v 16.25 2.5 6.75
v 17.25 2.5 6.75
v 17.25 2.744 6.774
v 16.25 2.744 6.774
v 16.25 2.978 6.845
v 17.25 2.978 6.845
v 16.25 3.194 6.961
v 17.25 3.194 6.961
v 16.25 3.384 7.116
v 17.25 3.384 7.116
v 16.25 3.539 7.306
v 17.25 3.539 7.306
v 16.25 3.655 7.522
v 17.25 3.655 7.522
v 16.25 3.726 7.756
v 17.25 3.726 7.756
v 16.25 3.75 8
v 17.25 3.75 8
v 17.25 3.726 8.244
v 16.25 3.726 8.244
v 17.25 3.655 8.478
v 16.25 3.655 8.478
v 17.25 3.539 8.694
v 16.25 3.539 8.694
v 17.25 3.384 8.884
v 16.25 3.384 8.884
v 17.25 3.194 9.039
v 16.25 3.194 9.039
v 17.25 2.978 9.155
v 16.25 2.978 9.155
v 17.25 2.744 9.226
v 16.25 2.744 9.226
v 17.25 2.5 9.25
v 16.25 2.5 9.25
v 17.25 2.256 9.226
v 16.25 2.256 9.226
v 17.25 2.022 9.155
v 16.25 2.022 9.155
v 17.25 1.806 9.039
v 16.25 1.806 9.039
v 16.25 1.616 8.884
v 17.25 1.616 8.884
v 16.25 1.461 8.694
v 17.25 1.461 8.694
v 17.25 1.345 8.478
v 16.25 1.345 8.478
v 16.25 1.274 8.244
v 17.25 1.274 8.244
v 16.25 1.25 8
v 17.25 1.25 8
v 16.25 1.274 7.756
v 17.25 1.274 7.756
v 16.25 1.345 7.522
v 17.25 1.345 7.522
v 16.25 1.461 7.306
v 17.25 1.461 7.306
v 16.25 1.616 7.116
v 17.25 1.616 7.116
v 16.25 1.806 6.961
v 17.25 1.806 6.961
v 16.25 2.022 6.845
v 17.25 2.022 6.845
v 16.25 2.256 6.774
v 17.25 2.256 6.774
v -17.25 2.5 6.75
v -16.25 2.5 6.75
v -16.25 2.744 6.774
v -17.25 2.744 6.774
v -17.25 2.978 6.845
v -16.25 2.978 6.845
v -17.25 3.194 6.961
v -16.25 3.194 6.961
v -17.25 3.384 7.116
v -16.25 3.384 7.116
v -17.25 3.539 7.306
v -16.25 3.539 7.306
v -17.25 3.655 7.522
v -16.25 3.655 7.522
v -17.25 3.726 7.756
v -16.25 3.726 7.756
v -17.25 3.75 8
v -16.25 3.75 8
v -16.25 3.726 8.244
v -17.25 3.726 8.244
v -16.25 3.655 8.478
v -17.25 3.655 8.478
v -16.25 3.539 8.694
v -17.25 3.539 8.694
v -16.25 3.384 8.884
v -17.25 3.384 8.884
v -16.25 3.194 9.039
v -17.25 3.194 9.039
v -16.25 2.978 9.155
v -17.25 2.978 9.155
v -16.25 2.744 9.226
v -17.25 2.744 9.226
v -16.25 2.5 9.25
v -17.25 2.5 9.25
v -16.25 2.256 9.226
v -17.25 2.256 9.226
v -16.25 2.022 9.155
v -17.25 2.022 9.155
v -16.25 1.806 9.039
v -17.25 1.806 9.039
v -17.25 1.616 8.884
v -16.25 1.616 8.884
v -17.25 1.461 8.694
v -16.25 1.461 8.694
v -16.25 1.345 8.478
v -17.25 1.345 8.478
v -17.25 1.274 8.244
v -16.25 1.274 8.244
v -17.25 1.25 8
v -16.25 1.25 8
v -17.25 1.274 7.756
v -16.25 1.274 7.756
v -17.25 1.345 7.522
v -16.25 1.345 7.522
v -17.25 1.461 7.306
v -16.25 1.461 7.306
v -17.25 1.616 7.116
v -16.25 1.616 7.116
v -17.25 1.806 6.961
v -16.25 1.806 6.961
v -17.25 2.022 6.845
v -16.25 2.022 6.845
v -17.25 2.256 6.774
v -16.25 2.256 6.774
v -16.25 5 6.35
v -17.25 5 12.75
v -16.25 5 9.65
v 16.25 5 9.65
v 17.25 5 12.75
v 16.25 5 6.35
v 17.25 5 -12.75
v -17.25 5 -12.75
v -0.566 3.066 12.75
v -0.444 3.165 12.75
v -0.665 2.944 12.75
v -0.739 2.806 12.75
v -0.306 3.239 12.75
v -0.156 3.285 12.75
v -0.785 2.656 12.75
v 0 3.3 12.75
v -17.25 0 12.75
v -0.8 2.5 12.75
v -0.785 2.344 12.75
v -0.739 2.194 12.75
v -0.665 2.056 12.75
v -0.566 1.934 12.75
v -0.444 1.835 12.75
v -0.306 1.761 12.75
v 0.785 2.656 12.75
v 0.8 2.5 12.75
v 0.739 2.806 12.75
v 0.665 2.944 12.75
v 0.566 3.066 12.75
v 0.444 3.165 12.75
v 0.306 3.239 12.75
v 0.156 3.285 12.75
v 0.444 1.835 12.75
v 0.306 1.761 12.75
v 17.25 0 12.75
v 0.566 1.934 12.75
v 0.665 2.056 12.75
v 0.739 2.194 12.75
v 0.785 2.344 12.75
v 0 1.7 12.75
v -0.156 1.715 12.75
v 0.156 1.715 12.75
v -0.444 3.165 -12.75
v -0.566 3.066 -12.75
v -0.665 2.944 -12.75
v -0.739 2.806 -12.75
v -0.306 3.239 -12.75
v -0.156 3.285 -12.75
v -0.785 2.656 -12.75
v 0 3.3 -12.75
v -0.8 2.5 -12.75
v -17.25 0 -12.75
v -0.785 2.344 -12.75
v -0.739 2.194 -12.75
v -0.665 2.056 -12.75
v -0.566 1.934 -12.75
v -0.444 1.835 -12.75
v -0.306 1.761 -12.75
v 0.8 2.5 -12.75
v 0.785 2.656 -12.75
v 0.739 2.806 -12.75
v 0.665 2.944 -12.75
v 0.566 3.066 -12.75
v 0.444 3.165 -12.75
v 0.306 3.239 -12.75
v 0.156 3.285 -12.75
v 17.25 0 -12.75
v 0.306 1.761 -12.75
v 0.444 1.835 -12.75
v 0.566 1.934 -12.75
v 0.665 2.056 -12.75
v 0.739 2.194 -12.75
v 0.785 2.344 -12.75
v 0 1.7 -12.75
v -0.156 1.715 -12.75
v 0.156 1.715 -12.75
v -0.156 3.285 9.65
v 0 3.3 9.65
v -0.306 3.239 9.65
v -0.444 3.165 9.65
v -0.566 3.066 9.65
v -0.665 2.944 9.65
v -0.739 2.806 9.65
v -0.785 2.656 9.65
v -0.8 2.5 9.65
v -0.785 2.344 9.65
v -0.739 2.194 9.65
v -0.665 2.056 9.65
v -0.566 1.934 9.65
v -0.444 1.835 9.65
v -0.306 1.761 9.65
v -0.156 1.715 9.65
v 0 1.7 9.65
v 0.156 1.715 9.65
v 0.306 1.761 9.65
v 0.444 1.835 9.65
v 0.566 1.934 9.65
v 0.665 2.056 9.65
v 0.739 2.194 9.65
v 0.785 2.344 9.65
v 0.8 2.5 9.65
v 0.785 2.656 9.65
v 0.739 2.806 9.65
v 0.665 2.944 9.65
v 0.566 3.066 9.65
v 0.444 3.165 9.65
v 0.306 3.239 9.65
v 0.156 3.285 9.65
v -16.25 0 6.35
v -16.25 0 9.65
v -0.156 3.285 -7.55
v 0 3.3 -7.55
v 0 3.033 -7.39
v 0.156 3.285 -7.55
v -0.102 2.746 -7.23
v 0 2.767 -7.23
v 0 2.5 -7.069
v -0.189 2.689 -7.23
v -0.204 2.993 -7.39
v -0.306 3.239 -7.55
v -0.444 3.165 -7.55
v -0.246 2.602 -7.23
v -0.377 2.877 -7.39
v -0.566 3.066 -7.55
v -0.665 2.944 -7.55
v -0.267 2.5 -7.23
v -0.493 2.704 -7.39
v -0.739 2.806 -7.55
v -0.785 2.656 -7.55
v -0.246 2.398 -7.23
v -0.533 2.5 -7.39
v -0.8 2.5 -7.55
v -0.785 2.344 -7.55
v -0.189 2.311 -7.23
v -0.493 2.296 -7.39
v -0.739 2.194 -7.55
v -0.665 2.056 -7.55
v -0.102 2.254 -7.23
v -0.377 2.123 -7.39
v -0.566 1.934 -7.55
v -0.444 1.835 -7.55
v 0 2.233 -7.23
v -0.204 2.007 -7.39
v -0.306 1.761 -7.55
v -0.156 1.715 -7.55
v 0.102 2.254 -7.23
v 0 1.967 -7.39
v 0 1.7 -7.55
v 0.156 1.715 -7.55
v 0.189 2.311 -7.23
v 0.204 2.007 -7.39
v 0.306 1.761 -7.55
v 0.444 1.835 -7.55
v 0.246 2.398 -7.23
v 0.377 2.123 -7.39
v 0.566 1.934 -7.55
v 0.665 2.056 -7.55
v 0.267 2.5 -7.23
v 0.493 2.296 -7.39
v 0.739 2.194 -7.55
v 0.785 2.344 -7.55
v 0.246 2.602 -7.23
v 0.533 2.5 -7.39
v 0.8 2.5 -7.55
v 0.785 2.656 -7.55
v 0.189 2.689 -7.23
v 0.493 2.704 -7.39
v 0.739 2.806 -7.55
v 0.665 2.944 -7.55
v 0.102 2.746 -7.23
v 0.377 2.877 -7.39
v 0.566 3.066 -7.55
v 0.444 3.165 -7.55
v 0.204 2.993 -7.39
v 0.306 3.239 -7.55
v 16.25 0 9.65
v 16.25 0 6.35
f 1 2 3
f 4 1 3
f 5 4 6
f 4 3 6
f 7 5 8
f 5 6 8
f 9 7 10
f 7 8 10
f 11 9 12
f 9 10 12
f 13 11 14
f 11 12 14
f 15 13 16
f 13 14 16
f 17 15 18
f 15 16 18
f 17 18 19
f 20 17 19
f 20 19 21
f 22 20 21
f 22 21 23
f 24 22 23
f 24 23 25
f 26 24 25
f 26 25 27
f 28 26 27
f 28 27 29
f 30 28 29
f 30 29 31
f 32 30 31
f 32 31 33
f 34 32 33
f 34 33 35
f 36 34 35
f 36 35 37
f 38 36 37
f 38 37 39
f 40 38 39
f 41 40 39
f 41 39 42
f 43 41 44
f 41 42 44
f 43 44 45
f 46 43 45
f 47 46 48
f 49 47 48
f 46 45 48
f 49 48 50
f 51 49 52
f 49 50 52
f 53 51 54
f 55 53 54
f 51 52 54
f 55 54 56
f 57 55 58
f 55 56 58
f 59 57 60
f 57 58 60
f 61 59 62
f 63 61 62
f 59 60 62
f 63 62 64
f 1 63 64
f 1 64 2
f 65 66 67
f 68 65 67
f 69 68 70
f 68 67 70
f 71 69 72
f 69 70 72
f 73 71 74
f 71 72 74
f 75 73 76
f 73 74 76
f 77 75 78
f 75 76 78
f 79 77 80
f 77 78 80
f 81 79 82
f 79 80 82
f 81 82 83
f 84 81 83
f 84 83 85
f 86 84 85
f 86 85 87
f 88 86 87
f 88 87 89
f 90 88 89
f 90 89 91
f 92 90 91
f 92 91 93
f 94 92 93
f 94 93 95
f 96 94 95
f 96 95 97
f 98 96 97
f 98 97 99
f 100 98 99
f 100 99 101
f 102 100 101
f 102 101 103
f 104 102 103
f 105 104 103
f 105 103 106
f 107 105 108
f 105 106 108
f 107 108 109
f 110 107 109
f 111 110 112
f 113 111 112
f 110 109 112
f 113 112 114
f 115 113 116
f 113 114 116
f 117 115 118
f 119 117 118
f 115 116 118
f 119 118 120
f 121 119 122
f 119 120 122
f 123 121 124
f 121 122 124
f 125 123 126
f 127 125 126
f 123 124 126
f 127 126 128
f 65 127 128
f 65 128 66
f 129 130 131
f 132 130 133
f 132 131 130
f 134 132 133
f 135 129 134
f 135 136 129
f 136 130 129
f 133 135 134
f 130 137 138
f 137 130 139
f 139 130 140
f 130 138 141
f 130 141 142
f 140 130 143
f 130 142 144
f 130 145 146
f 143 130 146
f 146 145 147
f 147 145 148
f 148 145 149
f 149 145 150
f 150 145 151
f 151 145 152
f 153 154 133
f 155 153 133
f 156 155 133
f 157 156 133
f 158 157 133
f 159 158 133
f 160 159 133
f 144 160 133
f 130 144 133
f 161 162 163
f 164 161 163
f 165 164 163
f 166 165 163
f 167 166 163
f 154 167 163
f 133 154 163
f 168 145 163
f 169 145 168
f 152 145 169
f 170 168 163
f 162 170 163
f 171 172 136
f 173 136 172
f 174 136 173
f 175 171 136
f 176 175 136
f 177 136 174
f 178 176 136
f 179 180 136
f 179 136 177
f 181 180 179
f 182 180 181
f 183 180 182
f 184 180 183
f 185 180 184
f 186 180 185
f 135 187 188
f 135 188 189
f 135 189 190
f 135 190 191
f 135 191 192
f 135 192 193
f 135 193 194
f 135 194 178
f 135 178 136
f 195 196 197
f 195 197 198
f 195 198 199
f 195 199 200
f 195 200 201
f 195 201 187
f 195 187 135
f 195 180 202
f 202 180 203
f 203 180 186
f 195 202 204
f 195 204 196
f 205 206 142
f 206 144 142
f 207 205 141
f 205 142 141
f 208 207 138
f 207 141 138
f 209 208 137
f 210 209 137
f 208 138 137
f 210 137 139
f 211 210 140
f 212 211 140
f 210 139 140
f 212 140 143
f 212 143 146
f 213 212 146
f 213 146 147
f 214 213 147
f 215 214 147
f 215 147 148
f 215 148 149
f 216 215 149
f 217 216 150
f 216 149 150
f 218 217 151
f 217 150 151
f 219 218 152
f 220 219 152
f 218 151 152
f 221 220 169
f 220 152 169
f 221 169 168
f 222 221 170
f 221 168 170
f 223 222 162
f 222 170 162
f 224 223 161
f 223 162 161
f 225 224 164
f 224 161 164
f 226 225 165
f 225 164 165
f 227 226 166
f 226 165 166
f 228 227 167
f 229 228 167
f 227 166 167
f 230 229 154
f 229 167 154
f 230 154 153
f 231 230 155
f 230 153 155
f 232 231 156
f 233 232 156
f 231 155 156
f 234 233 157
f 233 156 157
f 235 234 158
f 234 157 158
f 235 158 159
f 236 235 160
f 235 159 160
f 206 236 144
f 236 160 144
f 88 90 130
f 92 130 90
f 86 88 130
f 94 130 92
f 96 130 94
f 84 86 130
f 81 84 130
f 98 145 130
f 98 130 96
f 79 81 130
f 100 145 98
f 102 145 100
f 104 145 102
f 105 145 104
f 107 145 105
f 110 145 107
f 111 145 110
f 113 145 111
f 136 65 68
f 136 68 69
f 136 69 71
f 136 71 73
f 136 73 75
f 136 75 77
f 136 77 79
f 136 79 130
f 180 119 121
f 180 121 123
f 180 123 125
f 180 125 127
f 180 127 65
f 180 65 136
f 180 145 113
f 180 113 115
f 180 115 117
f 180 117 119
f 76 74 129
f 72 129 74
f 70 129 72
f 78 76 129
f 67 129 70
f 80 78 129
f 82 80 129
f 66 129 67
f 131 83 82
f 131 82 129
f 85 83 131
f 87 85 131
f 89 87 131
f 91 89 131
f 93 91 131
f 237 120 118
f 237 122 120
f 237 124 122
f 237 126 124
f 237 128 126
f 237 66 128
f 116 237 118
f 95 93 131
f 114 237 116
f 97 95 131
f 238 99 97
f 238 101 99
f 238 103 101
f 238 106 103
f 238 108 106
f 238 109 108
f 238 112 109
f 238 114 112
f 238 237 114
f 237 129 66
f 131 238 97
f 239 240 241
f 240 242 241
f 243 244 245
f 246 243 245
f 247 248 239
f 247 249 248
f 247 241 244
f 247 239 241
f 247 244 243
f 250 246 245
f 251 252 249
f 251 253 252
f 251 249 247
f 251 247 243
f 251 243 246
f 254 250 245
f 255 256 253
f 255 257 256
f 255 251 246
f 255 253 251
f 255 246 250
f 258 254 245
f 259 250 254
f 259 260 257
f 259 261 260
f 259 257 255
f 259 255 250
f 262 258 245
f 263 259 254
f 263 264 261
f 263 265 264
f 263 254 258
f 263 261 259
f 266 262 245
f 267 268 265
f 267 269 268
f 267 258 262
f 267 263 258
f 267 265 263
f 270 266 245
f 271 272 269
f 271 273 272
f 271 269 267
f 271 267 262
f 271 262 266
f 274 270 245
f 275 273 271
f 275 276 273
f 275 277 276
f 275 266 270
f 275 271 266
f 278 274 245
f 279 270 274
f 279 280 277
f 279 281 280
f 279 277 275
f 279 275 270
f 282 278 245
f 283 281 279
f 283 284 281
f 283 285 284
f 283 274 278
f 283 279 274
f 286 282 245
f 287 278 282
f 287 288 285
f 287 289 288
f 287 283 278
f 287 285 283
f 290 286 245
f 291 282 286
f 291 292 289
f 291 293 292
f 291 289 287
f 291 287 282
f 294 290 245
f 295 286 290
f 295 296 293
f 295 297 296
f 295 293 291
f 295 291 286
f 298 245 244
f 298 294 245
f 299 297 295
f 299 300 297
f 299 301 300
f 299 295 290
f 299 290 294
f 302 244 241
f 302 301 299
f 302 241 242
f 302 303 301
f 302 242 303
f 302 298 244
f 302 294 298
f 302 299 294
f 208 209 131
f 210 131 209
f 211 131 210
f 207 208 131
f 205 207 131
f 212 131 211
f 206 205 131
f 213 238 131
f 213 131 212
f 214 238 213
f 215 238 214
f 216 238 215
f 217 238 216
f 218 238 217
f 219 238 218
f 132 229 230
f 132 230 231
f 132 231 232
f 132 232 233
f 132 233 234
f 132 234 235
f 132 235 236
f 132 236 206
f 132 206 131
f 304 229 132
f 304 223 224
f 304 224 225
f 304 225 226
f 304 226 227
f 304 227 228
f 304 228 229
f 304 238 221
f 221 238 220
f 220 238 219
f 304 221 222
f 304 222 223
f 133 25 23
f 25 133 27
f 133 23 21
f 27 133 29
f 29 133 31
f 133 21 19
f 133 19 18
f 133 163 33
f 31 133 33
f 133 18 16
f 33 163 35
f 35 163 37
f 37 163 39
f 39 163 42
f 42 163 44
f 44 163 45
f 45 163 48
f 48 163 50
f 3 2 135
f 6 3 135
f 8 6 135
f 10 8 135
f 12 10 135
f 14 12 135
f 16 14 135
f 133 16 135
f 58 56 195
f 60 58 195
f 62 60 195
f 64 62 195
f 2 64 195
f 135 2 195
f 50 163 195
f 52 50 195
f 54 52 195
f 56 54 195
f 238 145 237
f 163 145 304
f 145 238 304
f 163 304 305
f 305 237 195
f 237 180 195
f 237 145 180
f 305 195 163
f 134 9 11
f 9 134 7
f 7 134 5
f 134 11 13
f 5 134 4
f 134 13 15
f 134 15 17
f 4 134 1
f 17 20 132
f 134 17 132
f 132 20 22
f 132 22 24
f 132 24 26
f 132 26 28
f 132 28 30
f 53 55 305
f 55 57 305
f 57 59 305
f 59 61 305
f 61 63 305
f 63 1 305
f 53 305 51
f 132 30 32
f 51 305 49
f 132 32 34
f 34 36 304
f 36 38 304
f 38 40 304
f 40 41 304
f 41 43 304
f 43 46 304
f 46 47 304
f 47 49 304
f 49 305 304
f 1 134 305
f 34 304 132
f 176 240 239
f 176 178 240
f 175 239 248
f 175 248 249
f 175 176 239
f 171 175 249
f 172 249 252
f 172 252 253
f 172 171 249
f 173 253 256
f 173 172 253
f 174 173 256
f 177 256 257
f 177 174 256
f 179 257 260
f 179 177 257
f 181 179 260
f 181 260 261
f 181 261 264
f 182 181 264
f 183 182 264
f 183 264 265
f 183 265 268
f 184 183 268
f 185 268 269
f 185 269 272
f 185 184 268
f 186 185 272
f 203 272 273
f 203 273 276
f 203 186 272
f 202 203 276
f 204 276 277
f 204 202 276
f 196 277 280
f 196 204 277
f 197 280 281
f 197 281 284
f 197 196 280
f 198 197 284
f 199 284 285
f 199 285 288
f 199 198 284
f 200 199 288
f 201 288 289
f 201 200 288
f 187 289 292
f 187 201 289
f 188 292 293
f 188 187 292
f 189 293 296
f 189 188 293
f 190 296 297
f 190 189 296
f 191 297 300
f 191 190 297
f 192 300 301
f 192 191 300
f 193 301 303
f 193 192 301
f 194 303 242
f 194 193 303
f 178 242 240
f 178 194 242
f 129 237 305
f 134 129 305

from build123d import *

# Parameters (mm, degrees)
SKETCH_1_W          = 34.5
SKETCH_1_H          = 25.5
EXTRUDE_1_DEPTH     = 5
SKETCH_5_W          = 32.5
SKETCH_5_H          = 3.3
CUT_EXTRUDE_1_DEPTH = 23.025553342
SKETCH_7_R          = 1.25
CUT_EXTRUDE_2_DEPTH = 38.118896805


with BuildPart() as part:
    # 草图1 → 凸台-拉伸1 (new body)
    with BuildSketch(Plane(origin=(0, 0, 0), x_dir=(1, 0, 0), z_dir=(0, 1, 0))):
        Rectangle(SKETCH_1_W, SKETCH_1_H)
    extrude(amount=EXTRUDE_1_DEPTH)

    # 草图5 → 切除-拉伸1 (cut, through all)
    with BuildSketch(Plane.XZ):
        with Locations((0, 8)):
            Rectangle(SKETCH_5_W, SKETCH_5_H)
    extrude(amount=-CUT_EXTRUDE_1_DEPTH, mode=Mode.SUBTRACT)

    # 草图7 → 切除-拉伸2 (cut, through all)
    with BuildSketch(Plane(origin=(17.25, 0, 0), x_dir=(0, 0, -1), z_dir=(1, 0, 0))):
        with Locations((-8, 2.5)):
            Circle(SKETCH_7_R)
    extrude(amount=-CUT_EXTRUDE_2_DEPTH, mode=Mode.SUBTRACT)

    # 草图8 → M2x0.4 螺纹孔1 (revolve, cut)
    with BuildSketch(Plane(origin=(0, 2.5, -12.75), x_dir=(0, 1, 0), z_dir=(1, 0, 0))):
        Polygon((0, 0), (0, 5.680688495), (0.8, 5.2), (0.8, 0), align=None)
    m2x0_4_1 = revolve(axis=Axis((0, 2.5, -19.1), (0, 0, 1)), mode=Mode.SUBTRACT)

    # 镜向1: M2x0.4 螺纹孔1 across plane
    add(m2x0_4_1.mirror(Plane.XY), mode=Mode.SUBTRACT)


solid = part.part
